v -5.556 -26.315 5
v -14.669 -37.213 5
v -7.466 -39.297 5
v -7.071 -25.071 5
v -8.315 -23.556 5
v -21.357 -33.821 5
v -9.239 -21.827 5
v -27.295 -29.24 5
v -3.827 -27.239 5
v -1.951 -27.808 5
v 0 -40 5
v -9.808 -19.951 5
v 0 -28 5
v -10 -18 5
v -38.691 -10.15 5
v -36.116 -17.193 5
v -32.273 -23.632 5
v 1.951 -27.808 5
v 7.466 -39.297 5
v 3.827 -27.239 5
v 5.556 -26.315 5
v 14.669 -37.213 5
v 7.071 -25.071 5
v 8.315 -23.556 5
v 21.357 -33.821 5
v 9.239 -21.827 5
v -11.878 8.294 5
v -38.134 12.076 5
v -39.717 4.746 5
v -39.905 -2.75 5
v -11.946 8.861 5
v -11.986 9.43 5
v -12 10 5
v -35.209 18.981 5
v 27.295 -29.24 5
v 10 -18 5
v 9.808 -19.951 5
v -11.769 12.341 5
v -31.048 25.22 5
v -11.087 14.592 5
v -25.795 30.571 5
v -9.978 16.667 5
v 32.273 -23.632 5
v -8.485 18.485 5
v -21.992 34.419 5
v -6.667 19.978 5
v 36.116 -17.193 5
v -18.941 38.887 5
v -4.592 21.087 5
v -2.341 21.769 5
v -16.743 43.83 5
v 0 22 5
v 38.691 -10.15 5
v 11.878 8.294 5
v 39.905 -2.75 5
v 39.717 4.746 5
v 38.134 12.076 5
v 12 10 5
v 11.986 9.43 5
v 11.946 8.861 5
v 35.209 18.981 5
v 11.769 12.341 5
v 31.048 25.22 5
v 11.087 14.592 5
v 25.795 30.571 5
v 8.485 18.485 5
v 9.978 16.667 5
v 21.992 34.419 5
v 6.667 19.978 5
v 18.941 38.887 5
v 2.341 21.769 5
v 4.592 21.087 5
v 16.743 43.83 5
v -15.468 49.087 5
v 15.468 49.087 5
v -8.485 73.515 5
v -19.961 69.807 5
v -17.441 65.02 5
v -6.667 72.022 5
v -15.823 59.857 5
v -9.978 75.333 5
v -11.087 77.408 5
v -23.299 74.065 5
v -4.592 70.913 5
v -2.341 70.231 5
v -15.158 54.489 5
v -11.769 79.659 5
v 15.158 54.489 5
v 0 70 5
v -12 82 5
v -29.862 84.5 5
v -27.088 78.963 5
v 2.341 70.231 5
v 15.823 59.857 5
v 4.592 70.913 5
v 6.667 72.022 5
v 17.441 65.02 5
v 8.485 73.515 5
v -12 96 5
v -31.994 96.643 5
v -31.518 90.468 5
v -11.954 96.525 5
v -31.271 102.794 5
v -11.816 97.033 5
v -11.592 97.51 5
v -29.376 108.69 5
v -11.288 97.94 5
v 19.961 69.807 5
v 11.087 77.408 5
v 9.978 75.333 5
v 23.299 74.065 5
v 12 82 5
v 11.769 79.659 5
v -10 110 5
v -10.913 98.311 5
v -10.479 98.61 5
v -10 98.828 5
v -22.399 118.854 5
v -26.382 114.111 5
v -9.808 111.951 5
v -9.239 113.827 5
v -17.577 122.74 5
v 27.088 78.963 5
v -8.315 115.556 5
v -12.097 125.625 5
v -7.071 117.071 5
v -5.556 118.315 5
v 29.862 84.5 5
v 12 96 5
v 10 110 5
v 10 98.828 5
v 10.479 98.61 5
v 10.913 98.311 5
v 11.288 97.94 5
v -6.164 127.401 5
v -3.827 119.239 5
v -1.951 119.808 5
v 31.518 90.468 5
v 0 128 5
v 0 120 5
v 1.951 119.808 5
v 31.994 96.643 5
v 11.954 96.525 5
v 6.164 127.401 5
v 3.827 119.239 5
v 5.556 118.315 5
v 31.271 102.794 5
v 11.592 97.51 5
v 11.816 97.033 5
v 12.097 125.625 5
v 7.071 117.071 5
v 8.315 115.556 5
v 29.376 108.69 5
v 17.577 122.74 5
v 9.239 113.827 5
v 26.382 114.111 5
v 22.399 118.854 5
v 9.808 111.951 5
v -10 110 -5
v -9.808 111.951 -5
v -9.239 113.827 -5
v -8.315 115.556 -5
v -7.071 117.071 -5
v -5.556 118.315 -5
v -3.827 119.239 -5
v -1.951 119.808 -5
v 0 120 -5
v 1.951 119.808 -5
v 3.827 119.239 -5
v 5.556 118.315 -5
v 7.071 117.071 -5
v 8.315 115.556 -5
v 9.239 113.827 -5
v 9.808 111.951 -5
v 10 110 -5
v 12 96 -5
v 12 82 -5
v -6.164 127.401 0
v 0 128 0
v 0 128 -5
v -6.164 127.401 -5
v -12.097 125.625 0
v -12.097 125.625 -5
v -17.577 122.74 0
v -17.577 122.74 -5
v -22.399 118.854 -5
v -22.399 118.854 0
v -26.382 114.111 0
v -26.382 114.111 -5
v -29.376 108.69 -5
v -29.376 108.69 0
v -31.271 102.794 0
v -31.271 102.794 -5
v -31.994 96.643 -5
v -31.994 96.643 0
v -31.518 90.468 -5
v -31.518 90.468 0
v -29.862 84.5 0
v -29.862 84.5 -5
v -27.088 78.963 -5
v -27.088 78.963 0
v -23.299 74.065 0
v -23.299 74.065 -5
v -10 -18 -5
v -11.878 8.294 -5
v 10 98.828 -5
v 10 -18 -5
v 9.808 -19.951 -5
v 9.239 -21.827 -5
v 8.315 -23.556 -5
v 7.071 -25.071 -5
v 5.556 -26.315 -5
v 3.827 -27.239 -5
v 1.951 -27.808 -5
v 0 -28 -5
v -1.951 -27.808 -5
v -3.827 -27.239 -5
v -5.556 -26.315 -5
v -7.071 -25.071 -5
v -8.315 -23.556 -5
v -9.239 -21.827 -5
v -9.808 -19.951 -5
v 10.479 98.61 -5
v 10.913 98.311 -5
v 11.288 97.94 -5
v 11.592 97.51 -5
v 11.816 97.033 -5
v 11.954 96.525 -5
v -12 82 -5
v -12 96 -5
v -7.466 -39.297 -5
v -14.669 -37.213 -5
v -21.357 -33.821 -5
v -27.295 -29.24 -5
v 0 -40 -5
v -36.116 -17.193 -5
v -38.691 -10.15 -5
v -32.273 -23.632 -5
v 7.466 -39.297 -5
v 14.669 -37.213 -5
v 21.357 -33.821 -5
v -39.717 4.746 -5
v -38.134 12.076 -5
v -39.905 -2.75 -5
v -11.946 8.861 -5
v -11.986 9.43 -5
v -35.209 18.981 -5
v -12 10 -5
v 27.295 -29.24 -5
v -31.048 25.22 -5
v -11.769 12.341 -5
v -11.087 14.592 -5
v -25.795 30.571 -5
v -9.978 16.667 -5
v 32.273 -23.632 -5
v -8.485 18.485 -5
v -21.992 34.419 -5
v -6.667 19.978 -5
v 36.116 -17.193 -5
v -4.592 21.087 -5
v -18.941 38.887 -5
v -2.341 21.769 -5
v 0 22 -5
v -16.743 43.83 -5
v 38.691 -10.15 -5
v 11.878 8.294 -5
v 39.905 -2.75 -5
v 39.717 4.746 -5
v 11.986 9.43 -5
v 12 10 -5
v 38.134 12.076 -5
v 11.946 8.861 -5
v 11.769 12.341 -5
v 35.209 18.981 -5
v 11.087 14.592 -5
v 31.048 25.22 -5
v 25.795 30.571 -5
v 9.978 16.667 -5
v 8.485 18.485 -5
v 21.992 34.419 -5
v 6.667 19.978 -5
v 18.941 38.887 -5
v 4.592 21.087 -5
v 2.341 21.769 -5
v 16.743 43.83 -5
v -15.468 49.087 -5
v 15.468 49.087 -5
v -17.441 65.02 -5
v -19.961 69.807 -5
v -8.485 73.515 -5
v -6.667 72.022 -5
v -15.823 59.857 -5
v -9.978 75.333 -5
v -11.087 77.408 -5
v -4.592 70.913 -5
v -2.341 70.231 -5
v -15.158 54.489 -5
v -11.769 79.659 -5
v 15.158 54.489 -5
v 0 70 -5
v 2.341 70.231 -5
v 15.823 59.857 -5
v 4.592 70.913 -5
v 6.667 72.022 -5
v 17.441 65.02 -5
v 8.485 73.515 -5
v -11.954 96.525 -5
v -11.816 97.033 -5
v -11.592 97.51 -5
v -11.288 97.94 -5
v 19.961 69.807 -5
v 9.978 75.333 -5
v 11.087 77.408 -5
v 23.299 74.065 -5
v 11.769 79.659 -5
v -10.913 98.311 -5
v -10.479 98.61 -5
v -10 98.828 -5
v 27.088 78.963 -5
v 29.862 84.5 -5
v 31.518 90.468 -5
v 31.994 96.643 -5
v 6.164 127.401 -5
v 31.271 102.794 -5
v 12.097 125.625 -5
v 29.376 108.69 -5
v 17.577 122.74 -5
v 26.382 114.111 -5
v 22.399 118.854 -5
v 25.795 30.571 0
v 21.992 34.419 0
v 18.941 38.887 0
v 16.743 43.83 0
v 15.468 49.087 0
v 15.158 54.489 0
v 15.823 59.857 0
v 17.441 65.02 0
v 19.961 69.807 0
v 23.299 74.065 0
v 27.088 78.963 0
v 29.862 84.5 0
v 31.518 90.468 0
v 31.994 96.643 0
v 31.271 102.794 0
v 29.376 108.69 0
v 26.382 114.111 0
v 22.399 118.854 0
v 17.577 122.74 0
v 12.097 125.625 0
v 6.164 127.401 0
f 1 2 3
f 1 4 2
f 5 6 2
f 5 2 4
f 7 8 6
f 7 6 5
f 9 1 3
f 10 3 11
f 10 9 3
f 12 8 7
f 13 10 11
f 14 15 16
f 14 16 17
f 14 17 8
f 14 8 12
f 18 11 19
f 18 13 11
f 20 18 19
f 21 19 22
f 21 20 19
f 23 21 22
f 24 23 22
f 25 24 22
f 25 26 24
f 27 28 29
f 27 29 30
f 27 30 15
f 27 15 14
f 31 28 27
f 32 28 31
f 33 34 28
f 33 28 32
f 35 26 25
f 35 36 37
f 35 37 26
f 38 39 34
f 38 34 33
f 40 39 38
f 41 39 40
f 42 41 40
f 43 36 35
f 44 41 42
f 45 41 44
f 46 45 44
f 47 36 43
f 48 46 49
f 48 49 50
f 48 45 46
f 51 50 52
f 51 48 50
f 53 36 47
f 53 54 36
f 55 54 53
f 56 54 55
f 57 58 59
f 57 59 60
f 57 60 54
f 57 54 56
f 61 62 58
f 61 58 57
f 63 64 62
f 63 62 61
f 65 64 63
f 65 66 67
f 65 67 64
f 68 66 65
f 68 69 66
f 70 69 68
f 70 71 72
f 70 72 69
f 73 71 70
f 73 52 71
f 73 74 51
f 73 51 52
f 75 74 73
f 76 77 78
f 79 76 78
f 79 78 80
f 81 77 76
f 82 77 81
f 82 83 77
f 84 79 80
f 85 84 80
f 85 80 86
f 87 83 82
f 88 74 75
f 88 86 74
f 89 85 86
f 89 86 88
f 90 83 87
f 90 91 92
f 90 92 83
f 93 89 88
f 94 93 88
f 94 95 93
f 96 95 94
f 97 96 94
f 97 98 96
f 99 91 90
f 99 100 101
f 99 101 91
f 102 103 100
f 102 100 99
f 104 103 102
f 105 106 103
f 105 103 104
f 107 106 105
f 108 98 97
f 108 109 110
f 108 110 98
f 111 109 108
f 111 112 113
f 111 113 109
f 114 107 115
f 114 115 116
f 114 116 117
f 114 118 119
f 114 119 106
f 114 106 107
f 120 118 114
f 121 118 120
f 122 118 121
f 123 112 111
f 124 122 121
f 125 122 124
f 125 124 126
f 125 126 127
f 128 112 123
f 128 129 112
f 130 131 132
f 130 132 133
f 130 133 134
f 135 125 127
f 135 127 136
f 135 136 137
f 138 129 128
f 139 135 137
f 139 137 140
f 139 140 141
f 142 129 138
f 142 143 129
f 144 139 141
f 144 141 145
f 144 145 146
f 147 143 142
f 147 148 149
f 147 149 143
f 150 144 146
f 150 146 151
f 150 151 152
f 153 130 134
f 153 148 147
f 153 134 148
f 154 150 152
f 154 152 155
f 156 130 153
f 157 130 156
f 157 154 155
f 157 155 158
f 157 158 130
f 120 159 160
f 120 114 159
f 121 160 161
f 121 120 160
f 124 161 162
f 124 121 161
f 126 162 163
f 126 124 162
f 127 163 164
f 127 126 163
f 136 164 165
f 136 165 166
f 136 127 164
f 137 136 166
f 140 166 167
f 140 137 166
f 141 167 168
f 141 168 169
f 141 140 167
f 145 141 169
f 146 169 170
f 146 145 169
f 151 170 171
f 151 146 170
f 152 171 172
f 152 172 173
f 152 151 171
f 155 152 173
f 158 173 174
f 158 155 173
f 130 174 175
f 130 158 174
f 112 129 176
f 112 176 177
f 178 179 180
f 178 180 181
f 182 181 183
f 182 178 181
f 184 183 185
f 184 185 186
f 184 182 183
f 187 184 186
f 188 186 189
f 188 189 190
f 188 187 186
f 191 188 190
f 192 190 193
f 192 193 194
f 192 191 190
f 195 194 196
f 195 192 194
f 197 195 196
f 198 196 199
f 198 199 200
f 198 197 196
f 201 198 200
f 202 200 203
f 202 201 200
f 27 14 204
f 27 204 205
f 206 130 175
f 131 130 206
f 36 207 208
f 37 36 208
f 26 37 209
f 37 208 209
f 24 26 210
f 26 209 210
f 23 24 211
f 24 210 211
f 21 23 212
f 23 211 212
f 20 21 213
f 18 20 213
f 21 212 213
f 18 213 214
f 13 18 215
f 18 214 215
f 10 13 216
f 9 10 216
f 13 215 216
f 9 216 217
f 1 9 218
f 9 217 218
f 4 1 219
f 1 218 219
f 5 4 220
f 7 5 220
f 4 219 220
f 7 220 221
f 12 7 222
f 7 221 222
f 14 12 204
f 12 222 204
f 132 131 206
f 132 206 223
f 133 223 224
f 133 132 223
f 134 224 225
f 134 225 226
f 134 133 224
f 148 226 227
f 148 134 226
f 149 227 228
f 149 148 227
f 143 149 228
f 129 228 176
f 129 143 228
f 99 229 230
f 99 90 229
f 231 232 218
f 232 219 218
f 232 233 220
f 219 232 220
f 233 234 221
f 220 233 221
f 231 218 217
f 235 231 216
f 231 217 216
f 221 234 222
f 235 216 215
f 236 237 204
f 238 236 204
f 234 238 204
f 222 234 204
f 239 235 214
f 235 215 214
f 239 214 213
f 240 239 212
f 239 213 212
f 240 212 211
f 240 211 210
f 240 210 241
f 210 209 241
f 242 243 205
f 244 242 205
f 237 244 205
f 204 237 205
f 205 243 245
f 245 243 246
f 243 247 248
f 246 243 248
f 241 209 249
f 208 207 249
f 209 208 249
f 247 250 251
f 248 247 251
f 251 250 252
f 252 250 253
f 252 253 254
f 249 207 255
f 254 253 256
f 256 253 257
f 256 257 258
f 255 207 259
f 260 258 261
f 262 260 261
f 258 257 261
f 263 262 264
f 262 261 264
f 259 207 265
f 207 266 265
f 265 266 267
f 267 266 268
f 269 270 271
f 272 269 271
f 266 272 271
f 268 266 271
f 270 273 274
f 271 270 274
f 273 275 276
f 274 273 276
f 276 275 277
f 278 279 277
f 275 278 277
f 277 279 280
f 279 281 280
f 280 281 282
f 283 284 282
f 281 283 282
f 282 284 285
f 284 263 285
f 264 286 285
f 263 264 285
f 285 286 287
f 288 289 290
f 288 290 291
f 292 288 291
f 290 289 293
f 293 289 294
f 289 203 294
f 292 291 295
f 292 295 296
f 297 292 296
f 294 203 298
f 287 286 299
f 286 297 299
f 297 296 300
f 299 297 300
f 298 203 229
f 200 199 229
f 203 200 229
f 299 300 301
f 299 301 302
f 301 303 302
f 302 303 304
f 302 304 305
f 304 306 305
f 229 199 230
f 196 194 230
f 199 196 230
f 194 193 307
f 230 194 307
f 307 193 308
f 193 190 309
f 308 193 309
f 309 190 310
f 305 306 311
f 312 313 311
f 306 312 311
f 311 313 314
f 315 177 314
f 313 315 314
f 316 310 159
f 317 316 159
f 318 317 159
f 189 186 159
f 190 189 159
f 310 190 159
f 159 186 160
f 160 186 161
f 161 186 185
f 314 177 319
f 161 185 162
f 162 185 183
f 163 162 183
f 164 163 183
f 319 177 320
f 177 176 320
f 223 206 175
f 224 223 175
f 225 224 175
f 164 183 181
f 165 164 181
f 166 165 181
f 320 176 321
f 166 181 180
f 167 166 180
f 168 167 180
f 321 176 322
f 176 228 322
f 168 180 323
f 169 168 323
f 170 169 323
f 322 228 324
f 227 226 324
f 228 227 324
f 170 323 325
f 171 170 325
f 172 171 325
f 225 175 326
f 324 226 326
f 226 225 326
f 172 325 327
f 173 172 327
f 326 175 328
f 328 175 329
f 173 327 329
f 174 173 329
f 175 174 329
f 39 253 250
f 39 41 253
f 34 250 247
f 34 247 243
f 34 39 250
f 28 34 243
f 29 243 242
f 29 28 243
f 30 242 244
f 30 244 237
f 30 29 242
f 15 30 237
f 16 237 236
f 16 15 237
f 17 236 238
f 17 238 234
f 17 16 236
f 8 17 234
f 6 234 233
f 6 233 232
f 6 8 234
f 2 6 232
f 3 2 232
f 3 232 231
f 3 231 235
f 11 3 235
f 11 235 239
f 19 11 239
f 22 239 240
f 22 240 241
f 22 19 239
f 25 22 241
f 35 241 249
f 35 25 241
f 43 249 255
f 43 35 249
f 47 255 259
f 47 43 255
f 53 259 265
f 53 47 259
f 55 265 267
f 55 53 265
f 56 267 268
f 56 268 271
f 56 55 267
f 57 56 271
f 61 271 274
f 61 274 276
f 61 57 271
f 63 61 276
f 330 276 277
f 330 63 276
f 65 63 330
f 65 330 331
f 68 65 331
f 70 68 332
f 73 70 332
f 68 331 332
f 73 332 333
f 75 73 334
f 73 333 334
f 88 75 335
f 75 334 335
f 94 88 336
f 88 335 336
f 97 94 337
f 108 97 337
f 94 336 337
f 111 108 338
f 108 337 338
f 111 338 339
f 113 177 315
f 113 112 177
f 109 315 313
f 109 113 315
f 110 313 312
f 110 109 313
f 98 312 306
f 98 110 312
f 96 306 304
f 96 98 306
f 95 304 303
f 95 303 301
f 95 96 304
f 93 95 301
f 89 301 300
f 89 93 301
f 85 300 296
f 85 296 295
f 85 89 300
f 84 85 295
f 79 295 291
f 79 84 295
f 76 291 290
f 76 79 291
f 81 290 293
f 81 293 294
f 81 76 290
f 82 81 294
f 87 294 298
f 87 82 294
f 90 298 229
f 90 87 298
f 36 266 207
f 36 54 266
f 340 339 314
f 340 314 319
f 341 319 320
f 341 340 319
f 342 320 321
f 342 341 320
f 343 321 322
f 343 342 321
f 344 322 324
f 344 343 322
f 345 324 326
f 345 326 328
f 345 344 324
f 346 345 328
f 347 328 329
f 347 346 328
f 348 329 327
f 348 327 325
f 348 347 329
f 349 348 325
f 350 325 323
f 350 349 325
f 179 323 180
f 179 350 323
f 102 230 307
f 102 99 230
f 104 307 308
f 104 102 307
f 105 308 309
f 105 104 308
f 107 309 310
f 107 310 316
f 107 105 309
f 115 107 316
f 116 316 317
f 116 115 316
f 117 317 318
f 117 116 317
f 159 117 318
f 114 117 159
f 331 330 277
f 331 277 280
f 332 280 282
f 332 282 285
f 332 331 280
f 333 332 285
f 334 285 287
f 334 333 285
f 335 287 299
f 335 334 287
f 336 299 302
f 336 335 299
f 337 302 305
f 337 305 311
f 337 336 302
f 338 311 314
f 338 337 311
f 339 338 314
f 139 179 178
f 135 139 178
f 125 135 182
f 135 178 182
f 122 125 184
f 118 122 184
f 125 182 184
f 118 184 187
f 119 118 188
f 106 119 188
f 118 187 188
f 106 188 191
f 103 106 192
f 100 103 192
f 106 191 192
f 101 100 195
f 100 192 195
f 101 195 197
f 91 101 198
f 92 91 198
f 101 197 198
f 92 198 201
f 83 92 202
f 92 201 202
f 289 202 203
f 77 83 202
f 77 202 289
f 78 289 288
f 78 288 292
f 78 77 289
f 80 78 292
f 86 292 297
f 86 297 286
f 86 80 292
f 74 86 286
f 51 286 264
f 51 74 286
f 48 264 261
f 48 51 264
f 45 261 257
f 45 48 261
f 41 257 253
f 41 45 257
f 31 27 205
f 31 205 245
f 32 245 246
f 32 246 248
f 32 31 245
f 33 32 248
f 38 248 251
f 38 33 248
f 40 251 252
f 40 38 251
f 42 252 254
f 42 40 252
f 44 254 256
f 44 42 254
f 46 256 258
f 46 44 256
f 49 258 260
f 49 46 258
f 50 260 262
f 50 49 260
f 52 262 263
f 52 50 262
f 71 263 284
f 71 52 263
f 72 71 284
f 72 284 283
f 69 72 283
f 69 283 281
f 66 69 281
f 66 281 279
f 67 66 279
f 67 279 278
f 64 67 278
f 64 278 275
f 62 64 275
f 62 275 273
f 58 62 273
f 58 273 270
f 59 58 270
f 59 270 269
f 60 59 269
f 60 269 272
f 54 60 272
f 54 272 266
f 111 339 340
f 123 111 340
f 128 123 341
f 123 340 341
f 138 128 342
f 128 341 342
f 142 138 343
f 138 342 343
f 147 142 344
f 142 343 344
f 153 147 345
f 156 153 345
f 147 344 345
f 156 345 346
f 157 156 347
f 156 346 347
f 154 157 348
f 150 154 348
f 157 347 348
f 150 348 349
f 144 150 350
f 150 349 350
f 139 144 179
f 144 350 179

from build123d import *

# Parameters (mm, degrees)
BOSS_EXTRUDE1_DEPTH = 5


with BuildPart() as part:
    # Sketch1 → Boss-Extrude1 (new, symmetric)
    # profile 1 of 2: a face of its own
    with BuildSketch(Plane.XY):
        with BuildLine():
            ThreePointArc((23.298809999, 74.064516129), (29.376312637, 108.689848536), (1.88e-07, 128))
            ThreePointArc((1.88e-07, 128), (-29.376312562, 108.689848709), (-23.298809999, 74.064516129))
            ThreePointArc((-23.298809999, 74.064516129), (-15.190736019, 51.78096855), (-25.79511107, 30.571428571))
            ThreePointArc((-25.79511107, 30.571428571), (0, -40), (25.79511107, 30.571428571))
            ThreePointArc((25.79511107, 30.571428571), (15.190736019, 51.78096855), (23.298809999, 74.064516129))
        make_face()
        with BuildLine():
            ThreePointArc((-11.878172589, 8.294416244), (-11.969504398, 9.1450354), (-12, 10))
            ThreePointArc((-12, 10), (0, 22), (12, 10))
            ThreePointArc((12, 10), (11.969504398, 9.1450354), (11.878172589, 8.294416244))
            Line((11.878172589, 8.294416244), (10, -18))
            ThreePointArc((10, -18), (0, -28), (-10, -18))
            Line((-10, -18), (-11.878172589, 8.294416244))
        make_face(mode=Mode.SUBTRACT)
        with BuildLine():
            ThreePointArc((22, 82), (0, 60), (-22, 82))
            Line((-22, 82), (-22, 106))
            ThreePointArc((-22, 106), (-15.55634912, 121.556349253), (1.88e-07, 128))
            ThreePointArc((1.88e-07, 128), (15.556349253, 121.55634912), (22, 106))
            Line((22, 106), (22, 82))
        make_face(mode=Mode.SUBTRACT)
    # profile 2 of 2: a face of its own
    with BuildSketch(Plane.XY):
        with BuildLine():
            Line((22, 82), (22, 106))
            ThreePointArc((22, 106), (0, 128), (-22, 106))
            Line((-22, 106), (-22, 82))
            ThreePointArc((-22, 82), (0, 60), (22, 82))
        make_face()
        with BuildLine():
            Line((10, 110), (10, 98.828427125))
            ThreePointArc((10, 98.828427125), (11.449489743, 97.732050808), (12, 96))
            Line((12, 96), (12, 82))
            ThreePointArc((12, 82), (0, 70), (-12, 82))
            Line((-12, 82), (-12, 96))
            ThreePointArc((-12, 96), (-11.449489743, 97.732050808), (-10, 98.828427125))
            Line((-10, 98.828427125), (-10, 110))
            ThreePointArc((-10, 110), (0, 120), (10, 110))
        make_face(mode=Mode.SUBTRACT)
    extrude(amount=BOSS_EXTRUDE1_DEPTH, both=True)


solid = part.part
